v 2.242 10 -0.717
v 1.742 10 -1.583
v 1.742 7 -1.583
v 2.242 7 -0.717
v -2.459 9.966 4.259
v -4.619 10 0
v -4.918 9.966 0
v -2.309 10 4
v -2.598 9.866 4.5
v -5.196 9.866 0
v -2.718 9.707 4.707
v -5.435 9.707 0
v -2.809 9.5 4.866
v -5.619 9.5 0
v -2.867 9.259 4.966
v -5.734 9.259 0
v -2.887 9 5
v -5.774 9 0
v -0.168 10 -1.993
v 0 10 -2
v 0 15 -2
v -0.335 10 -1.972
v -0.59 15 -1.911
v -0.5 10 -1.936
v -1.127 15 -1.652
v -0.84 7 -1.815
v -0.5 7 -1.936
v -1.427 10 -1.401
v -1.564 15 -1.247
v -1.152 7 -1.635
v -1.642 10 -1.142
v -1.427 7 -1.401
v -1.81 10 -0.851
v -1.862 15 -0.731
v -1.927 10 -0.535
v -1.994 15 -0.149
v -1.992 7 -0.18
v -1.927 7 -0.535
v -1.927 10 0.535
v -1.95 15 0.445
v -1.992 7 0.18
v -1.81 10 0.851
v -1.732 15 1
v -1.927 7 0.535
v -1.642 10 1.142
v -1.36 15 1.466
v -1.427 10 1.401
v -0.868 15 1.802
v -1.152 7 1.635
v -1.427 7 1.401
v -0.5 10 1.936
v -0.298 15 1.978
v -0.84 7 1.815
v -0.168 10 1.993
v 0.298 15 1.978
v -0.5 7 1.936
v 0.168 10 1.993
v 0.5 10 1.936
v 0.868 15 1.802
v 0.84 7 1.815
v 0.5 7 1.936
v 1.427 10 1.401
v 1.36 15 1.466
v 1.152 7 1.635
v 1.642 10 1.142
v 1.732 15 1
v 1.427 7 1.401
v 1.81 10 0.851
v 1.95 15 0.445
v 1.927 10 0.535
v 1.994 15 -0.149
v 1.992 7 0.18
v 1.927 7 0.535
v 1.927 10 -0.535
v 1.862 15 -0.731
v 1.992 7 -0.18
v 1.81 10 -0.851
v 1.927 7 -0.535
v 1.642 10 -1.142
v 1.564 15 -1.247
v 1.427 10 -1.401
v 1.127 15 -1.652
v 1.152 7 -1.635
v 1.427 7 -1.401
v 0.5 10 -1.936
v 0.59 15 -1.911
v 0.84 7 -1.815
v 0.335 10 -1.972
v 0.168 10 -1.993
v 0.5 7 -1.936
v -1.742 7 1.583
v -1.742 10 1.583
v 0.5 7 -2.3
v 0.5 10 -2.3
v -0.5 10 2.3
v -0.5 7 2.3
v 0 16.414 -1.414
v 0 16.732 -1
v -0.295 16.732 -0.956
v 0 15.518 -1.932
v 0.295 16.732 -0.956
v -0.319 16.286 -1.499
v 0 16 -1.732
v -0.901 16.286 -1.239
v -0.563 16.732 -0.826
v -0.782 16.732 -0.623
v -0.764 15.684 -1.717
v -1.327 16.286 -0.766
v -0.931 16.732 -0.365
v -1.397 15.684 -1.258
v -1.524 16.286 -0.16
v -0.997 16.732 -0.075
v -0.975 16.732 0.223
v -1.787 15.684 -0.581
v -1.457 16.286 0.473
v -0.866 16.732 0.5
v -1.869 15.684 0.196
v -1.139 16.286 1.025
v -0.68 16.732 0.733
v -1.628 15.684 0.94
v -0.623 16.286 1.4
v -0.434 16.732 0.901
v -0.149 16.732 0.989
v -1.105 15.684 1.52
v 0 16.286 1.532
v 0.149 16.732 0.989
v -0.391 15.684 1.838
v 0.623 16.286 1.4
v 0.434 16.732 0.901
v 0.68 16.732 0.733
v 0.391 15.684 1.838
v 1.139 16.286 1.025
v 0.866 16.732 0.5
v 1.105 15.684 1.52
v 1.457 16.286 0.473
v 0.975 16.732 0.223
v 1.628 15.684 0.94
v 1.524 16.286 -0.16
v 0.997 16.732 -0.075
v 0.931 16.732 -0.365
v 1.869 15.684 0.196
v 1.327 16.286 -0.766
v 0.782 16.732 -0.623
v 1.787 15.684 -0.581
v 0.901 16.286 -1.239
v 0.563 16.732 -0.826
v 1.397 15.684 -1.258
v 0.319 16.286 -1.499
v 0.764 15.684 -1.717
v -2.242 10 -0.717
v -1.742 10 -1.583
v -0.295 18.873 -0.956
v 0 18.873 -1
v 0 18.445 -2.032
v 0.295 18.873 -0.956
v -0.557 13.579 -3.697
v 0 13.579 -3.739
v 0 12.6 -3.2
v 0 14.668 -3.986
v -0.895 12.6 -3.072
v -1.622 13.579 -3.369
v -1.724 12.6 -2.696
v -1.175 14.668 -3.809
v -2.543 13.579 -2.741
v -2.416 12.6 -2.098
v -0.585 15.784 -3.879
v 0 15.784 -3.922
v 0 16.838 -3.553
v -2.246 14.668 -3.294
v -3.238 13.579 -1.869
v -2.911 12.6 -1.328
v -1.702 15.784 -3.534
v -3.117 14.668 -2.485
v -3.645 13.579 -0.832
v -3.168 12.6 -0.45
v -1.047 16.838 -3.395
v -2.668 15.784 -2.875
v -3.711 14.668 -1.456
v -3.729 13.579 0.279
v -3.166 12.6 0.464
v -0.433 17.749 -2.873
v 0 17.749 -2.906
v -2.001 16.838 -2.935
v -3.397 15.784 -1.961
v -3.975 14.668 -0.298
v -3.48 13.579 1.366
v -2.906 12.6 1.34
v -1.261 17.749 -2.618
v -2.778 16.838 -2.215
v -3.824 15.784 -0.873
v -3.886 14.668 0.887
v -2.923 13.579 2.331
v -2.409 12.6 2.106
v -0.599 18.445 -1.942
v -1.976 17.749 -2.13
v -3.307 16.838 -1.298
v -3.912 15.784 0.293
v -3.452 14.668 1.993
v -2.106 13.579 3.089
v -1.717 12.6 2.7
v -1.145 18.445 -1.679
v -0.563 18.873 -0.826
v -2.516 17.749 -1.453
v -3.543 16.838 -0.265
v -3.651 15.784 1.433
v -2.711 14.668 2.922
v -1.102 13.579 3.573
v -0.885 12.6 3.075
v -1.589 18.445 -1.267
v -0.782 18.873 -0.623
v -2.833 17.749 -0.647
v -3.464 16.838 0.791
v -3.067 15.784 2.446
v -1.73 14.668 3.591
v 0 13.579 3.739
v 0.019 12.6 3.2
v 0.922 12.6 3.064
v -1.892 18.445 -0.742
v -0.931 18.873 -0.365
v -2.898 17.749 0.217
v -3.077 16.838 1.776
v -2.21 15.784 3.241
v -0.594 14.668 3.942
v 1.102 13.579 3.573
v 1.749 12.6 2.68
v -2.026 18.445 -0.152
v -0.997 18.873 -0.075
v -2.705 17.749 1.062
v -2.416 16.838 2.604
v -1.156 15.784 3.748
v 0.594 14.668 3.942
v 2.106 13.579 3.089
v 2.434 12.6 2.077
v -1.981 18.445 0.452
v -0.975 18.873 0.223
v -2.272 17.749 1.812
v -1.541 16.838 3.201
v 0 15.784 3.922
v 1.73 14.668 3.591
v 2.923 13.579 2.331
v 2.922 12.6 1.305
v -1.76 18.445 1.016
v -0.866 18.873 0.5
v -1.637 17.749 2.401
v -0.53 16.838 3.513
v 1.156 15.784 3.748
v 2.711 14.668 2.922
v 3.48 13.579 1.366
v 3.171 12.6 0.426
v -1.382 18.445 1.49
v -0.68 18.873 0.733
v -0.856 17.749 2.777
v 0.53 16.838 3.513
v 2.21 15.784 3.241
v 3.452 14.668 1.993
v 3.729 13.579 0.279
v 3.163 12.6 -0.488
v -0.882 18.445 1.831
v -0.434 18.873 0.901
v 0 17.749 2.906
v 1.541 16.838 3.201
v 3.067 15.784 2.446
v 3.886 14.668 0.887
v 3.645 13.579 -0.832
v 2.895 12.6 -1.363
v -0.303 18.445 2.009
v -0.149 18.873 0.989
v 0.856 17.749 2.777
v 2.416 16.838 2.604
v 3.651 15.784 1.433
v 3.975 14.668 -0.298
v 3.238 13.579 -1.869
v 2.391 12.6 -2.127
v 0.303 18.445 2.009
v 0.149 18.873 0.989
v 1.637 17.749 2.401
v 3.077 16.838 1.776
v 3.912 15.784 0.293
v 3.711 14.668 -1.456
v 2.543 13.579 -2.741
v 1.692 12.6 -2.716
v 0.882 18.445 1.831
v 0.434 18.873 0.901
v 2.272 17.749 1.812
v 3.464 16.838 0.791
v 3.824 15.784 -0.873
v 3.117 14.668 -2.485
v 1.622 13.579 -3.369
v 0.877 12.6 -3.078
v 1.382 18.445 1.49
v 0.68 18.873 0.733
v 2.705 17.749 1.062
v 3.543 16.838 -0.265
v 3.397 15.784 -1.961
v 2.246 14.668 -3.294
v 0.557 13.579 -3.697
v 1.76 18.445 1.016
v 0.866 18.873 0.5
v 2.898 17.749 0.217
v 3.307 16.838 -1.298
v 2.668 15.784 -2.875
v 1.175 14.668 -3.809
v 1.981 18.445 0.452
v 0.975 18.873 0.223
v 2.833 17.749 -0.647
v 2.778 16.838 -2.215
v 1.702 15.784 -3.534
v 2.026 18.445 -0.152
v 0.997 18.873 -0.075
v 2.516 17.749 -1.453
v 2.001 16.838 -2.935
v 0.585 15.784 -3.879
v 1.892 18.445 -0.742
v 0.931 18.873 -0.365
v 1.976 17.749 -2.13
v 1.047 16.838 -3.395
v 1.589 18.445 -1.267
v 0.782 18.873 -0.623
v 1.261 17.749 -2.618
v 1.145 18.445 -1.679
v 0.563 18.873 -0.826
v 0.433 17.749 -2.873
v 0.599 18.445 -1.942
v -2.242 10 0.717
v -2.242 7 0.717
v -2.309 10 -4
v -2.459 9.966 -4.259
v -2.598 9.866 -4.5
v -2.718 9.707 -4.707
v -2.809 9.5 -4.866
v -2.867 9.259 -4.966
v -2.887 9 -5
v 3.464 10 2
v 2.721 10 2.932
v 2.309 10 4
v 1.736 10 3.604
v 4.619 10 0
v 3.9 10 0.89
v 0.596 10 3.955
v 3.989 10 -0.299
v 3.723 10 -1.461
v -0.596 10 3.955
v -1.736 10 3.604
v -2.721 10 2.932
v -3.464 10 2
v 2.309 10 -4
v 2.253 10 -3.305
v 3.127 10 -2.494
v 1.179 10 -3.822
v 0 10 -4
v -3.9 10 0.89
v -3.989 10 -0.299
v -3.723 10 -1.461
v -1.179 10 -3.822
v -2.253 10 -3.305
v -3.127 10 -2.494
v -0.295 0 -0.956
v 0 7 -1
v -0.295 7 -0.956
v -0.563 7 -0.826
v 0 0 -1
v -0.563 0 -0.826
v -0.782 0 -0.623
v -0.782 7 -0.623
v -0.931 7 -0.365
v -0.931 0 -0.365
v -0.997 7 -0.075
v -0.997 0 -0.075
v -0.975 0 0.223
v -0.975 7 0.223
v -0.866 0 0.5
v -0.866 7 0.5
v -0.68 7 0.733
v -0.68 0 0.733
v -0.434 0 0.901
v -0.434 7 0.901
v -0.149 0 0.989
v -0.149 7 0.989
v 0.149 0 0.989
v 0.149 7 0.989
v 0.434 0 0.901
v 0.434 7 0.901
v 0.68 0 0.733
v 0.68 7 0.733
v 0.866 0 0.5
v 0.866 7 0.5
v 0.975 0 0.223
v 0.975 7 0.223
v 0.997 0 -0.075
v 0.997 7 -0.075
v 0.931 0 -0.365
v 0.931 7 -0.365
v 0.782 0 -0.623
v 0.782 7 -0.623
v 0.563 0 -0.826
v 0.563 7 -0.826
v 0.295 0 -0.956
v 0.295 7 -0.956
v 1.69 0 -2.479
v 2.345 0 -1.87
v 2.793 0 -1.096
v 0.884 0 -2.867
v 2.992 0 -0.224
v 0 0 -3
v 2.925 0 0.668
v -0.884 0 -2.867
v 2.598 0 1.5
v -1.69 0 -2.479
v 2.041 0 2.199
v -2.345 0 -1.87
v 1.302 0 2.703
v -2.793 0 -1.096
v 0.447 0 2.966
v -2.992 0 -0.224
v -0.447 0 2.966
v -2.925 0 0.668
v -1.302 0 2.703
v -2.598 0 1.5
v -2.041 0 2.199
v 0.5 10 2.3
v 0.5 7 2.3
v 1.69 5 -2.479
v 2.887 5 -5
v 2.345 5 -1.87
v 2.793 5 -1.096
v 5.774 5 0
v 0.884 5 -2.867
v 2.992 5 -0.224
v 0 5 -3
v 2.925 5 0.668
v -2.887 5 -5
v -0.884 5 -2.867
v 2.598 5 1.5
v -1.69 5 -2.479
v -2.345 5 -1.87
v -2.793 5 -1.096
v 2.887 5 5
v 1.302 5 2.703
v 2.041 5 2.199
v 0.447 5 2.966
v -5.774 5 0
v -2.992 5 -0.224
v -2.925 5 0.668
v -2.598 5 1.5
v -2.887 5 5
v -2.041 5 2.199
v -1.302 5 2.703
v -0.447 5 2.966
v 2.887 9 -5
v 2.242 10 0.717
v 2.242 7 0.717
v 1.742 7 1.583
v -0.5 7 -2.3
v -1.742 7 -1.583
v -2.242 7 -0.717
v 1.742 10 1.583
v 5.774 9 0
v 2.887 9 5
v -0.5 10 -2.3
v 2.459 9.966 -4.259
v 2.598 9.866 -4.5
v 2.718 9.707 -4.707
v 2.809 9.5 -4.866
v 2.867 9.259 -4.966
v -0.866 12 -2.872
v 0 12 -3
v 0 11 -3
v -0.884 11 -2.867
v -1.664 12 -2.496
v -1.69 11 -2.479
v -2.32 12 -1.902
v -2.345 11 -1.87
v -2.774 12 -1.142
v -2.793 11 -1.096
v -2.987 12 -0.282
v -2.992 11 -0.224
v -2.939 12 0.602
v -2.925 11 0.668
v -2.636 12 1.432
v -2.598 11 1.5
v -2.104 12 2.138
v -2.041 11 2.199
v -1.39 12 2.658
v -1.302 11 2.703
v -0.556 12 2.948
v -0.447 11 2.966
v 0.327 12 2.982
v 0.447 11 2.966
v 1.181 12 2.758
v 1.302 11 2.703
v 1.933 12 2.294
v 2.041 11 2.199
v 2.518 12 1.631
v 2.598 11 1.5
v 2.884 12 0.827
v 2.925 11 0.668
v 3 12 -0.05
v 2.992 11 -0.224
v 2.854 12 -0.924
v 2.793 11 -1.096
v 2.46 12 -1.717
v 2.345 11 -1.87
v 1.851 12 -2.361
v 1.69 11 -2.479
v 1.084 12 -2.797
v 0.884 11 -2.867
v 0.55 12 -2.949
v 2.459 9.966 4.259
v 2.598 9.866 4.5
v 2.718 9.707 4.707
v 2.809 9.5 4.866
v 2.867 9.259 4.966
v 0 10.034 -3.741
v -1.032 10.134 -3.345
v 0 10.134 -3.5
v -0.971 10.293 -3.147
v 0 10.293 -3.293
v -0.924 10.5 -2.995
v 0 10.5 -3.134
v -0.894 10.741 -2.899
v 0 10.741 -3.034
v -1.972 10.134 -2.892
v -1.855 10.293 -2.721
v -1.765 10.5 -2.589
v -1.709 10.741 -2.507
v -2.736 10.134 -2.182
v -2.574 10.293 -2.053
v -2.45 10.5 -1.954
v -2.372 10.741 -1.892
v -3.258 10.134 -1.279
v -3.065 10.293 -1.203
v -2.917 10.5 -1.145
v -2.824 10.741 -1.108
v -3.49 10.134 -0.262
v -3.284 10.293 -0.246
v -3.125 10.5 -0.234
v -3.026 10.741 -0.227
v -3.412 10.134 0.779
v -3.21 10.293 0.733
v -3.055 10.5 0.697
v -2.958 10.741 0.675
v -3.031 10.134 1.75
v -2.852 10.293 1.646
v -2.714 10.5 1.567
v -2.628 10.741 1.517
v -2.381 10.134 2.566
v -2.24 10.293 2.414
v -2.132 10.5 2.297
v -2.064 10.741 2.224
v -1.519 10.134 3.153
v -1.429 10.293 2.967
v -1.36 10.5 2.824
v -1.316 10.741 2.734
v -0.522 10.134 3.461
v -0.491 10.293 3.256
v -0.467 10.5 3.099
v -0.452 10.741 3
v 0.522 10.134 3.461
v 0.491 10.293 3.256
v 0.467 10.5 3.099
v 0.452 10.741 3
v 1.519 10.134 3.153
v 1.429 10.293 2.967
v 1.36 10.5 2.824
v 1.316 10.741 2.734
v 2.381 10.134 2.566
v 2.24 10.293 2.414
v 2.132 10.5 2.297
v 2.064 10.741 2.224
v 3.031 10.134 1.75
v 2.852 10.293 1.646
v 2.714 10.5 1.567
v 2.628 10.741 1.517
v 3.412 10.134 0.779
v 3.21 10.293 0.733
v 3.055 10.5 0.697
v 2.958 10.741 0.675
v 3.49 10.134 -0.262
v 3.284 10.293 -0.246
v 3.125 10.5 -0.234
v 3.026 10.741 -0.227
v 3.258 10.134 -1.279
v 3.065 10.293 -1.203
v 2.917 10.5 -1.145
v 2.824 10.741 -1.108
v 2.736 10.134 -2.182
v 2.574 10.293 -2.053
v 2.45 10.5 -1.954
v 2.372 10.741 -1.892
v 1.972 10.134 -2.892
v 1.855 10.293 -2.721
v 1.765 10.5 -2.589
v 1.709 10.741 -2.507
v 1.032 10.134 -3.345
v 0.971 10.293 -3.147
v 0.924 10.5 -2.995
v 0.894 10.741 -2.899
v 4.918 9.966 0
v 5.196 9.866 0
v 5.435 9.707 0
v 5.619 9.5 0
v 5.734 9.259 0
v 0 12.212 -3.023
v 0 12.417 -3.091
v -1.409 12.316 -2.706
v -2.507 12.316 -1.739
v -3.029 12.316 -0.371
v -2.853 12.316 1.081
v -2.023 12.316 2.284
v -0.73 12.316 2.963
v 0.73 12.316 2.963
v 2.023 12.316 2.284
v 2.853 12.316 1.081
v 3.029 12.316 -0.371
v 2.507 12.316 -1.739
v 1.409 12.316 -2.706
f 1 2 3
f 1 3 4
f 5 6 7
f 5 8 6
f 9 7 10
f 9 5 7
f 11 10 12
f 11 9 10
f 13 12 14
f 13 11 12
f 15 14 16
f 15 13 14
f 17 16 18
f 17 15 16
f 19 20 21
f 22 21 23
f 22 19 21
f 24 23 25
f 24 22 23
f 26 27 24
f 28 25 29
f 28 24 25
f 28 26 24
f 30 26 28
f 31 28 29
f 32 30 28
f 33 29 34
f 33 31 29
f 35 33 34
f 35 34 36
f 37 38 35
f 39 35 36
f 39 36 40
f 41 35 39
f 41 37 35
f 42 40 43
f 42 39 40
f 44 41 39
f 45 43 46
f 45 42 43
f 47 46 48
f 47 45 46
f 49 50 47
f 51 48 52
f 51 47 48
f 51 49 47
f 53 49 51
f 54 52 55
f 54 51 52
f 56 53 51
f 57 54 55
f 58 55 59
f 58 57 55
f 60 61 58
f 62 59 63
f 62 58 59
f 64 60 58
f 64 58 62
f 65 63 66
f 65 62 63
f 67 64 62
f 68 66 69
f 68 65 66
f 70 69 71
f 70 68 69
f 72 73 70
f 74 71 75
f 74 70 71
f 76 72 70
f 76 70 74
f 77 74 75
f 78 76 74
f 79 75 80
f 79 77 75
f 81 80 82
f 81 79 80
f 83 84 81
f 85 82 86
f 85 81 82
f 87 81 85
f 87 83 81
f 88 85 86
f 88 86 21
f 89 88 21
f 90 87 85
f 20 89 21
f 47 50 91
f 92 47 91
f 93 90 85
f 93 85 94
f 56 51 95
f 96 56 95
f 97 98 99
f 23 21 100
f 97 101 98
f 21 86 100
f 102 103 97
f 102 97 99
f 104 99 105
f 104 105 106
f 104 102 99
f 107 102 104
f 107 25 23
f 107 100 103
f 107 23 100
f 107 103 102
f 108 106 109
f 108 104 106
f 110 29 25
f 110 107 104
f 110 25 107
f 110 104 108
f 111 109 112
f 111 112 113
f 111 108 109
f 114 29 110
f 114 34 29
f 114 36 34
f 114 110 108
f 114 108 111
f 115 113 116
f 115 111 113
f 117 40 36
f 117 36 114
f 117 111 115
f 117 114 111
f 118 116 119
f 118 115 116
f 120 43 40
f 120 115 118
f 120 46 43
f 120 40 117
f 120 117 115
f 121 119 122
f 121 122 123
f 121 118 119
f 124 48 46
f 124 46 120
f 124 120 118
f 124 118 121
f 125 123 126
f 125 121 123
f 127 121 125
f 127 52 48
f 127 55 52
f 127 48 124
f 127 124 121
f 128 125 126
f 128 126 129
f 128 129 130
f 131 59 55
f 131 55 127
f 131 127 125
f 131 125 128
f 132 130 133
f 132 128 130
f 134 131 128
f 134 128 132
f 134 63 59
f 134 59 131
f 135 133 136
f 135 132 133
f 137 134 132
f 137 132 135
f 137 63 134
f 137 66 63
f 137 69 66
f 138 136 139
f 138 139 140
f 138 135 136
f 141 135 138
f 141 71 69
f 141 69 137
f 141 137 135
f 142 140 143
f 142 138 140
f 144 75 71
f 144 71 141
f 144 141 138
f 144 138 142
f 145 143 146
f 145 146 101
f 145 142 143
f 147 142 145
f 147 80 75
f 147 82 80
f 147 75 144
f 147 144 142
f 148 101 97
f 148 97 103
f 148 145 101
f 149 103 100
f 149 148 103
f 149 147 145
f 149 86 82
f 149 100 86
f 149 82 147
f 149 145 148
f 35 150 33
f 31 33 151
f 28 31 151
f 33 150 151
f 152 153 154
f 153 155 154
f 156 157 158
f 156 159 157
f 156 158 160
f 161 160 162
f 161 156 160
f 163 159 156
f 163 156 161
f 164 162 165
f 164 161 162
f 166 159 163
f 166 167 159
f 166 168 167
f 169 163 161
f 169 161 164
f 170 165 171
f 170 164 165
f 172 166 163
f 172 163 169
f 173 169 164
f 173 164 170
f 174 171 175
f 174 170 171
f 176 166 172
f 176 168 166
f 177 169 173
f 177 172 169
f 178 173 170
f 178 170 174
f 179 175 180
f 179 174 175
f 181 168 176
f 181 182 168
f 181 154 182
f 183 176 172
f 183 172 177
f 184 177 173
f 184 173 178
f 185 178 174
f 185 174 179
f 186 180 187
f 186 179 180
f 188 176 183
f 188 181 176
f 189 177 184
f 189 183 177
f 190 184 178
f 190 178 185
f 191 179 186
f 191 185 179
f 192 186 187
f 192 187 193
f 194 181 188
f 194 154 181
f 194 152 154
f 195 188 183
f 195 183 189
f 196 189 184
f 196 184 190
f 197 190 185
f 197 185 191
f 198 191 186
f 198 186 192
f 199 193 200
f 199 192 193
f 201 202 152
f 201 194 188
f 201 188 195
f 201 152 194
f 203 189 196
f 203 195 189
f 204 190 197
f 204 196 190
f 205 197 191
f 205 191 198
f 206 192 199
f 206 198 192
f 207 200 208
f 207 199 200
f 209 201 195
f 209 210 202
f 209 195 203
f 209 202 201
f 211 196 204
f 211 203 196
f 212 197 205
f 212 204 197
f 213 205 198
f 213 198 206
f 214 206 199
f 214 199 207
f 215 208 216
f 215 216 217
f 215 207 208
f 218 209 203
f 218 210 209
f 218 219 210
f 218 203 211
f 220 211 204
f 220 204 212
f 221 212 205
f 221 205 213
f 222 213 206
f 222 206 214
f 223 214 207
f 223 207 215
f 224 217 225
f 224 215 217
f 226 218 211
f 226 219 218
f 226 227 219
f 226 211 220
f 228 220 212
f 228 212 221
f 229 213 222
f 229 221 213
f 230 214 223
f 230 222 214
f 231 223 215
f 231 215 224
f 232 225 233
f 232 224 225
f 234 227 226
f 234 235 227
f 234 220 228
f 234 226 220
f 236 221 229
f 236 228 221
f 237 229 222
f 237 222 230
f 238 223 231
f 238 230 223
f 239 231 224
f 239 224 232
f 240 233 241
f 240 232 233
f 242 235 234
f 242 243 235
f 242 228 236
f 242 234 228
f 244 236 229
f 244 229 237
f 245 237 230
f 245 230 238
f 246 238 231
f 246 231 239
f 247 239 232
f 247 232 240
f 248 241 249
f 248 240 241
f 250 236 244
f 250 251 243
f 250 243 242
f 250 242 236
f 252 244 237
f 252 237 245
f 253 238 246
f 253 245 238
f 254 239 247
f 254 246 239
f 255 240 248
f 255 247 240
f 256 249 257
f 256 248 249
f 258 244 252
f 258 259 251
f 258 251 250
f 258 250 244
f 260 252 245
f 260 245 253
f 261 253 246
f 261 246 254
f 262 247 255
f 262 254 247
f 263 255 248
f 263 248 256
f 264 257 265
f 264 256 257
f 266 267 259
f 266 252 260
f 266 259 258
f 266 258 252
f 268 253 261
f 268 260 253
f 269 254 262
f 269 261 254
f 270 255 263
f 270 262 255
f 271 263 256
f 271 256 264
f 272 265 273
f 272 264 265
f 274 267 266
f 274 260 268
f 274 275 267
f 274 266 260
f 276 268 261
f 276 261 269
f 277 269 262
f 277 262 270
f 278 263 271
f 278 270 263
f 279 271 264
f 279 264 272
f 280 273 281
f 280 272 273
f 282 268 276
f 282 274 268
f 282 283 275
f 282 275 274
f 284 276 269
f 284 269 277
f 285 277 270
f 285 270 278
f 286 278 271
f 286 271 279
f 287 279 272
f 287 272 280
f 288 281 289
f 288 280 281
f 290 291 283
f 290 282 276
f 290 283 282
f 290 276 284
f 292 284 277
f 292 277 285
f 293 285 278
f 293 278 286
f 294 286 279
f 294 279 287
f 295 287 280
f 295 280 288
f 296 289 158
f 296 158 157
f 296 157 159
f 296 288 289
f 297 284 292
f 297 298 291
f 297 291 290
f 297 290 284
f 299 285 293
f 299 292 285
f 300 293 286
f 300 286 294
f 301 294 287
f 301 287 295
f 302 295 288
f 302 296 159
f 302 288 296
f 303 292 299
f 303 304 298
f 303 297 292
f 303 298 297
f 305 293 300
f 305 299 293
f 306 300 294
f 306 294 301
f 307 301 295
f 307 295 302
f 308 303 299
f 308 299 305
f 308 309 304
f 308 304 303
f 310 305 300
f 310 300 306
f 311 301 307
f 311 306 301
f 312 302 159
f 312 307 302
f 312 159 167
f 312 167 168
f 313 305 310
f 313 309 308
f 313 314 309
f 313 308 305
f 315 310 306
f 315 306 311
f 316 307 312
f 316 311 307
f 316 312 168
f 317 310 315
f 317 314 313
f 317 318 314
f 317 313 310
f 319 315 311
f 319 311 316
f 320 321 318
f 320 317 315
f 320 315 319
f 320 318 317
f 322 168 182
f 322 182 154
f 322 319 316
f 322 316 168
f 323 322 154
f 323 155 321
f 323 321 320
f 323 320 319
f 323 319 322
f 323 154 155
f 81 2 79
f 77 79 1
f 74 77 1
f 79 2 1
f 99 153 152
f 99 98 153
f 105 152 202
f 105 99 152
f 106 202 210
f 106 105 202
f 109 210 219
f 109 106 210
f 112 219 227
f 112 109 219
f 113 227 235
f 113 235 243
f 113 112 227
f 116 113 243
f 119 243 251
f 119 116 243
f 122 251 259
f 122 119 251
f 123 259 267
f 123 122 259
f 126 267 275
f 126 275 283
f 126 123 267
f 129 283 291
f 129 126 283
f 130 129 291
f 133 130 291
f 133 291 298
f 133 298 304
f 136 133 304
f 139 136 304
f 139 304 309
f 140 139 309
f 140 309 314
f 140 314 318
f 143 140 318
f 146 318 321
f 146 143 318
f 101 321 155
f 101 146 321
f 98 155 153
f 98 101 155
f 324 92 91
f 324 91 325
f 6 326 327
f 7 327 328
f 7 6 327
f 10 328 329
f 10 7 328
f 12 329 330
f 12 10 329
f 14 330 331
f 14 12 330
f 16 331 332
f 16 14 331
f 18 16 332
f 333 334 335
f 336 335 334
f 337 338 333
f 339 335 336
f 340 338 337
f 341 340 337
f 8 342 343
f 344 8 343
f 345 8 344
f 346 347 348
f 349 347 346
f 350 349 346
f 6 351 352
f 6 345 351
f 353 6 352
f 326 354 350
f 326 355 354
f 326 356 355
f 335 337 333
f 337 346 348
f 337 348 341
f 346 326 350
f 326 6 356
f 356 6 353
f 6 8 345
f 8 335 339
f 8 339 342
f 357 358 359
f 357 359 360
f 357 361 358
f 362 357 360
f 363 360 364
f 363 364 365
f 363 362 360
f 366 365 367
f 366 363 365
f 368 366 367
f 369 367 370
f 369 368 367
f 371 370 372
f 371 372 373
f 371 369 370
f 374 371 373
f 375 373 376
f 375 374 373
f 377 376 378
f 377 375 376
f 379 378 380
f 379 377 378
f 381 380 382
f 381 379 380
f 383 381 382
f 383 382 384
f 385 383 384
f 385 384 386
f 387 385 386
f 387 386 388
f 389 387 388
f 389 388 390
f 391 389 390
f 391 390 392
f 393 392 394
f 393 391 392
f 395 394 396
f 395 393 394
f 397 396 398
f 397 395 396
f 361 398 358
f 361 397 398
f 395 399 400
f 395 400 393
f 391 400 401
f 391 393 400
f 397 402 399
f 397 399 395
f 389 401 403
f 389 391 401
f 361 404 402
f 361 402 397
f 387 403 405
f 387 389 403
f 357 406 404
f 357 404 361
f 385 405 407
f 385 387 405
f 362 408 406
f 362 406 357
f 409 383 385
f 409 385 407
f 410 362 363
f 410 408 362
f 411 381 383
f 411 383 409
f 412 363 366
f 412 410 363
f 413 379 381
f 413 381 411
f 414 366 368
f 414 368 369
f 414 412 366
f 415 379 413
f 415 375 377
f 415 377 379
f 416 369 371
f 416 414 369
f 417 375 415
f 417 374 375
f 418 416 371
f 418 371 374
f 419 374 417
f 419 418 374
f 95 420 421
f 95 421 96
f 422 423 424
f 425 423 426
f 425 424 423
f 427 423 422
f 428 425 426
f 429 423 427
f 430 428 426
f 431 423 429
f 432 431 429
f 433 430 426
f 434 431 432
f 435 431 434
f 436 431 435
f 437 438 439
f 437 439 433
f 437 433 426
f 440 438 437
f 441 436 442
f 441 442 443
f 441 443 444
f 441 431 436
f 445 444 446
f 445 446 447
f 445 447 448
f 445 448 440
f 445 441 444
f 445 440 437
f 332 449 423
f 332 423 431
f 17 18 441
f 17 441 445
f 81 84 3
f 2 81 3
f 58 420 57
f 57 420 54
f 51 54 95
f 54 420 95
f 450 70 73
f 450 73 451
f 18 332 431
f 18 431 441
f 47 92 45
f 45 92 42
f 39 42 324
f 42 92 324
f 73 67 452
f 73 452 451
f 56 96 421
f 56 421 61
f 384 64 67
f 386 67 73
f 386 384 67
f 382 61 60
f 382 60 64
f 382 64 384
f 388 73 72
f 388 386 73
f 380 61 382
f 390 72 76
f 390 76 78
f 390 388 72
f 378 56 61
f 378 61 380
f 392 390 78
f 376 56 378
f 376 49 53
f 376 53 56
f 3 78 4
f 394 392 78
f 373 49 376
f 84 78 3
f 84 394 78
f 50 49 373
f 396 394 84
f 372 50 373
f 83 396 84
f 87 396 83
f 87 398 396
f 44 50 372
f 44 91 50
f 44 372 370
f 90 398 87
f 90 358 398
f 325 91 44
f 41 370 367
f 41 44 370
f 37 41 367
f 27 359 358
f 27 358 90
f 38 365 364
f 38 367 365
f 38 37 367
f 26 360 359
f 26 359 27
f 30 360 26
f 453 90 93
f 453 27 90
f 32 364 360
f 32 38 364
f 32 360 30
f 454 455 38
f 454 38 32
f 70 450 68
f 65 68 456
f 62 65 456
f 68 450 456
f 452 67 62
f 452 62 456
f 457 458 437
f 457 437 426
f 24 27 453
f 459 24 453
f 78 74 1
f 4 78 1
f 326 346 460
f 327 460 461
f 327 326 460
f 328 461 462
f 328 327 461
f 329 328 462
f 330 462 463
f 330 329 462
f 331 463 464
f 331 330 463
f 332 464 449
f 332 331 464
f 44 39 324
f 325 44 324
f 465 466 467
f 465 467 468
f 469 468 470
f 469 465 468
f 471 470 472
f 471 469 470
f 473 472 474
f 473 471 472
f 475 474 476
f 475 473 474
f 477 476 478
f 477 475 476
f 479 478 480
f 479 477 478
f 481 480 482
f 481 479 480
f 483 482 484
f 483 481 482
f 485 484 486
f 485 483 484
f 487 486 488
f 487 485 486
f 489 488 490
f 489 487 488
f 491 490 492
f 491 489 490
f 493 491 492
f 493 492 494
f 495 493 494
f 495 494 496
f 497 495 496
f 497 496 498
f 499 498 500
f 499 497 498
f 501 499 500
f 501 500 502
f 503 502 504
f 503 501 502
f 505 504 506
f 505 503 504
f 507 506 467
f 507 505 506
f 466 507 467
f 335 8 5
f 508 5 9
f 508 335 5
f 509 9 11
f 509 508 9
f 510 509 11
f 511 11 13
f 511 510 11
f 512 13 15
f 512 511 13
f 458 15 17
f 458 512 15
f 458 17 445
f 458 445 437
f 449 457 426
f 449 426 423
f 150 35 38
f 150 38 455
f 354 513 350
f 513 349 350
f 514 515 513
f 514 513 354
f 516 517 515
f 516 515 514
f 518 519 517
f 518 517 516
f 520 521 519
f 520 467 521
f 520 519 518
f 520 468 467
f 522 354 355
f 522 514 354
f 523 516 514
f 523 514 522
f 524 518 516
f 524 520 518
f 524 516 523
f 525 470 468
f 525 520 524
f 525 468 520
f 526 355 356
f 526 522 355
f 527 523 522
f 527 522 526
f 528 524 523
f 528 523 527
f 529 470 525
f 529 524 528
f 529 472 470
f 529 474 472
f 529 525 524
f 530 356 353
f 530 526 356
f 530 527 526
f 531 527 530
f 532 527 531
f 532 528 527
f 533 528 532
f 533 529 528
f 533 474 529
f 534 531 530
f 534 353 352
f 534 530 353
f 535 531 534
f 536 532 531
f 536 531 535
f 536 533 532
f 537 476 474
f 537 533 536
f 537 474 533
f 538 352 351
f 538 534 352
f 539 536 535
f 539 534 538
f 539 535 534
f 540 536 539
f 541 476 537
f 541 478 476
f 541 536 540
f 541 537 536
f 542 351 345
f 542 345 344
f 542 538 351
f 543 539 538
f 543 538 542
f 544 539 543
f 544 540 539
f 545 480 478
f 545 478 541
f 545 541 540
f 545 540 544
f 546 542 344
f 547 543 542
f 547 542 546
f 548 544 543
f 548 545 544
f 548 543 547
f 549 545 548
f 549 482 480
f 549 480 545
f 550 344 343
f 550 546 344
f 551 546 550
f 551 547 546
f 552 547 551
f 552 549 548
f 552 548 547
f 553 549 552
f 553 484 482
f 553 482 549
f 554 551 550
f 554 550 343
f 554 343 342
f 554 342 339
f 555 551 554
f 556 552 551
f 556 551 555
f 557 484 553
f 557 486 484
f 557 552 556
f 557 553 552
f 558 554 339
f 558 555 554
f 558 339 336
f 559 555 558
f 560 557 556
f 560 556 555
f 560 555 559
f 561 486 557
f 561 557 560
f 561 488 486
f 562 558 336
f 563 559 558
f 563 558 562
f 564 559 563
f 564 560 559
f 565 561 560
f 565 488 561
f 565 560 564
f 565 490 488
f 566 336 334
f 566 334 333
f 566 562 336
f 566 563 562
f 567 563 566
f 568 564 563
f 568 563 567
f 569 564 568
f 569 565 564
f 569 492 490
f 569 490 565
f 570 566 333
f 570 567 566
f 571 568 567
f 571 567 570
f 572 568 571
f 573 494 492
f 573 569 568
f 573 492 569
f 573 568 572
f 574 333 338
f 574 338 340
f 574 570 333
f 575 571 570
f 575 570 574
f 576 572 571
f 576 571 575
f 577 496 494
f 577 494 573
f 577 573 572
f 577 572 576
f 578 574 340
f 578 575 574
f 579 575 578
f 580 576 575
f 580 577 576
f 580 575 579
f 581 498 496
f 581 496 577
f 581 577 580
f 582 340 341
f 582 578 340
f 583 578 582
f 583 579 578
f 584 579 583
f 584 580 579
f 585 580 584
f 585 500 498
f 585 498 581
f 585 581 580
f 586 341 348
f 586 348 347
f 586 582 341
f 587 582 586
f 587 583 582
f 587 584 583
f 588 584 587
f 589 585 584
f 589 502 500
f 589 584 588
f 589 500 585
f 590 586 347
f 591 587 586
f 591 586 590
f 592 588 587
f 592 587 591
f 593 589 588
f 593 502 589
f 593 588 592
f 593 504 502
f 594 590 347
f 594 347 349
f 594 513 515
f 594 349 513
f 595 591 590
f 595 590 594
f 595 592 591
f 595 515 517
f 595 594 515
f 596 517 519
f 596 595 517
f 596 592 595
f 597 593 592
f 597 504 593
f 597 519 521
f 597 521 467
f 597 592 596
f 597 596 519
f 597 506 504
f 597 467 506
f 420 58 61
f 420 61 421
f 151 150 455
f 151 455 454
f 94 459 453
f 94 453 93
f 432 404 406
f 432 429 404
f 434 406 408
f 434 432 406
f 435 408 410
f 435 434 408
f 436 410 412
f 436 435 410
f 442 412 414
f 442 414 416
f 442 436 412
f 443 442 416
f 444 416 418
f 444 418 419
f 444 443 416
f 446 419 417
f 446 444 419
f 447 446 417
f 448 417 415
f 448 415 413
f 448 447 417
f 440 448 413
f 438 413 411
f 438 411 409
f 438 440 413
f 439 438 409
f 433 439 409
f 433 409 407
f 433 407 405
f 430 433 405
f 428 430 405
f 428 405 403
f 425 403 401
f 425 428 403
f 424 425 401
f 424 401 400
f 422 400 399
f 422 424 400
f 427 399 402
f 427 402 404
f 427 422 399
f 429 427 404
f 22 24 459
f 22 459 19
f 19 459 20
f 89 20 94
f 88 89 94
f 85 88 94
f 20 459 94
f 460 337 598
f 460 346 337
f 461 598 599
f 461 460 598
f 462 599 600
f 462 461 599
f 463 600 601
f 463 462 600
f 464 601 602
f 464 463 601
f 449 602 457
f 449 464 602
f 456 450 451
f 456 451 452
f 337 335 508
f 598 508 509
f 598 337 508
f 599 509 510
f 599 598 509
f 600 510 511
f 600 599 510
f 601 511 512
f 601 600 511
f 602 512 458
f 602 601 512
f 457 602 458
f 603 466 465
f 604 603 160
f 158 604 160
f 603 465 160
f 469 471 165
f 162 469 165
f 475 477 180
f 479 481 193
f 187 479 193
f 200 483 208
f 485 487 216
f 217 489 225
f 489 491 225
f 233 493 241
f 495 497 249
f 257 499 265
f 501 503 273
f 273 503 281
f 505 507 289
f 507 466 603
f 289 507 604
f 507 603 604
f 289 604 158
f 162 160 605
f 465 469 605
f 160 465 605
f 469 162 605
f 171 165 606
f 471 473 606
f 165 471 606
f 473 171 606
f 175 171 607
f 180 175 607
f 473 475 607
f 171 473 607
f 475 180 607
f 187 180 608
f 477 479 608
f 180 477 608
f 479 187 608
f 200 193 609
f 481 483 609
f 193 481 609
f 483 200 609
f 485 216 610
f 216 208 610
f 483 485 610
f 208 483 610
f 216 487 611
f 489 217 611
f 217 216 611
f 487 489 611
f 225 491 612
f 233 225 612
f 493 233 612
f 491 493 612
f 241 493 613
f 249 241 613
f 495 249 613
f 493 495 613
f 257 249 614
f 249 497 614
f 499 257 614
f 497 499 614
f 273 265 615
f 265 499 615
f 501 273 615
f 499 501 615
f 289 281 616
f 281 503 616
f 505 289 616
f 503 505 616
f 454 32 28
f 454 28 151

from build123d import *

# Parameters (mm, degrees)
SKETCH2_R          = 10.06808877
CUT_EXTRUDE1_DEPTH = 10
FILLET1_R          = 1
FILLET2_R          = 1
SKETCH3_W          = 1
SKETCH3_H          = 0.936459383
CUT_EXTRUDE2_DEPTH = 3
CIRPATTERN1_COUNT  = 6


with BuildPart() as part:
    # Sketch1 → Revolve1 (revolve)
    with BuildSketch(Plane.XY, mode=Mode.PRIVATE) as revolve1_sk:
        with BuildLine():
            Line((-1, 0), (-3, 0))
            Line((-3, 0), (-3, 5))
            Line((-3, 5), (-6, 5))
            Line((-6, 5), (-6, 10))
            Line((-6, 10), (-3, 10))
            Line((-3, 10), (-3, 12.354248689))
            ThreePointArc((-3, 12.354248689), (-3.824065295, 16.173253859), (-1, 18.872983346))
            Line((-1, 18.872983346), (-1, 16.732050808))
            ThreePointArc((-1, 16.732050808), (-1.732050808, 16), (-2, 15))
            Line((-2, 15), (-2, 7))
            Line((-2, 7), (-1, 7))
            Line((-1, 7), (-1, 0))
        make_face()
    revolve(revolve1_sk.sketch.rotate(Axis((0, 0, 0), (0, 1, 0)), 270), axis=Axis((0, 0, 0), (0, 1, 0)))

    # Sketch2 → Cut-Extrude1 (cut)
    with BuildSketch(Plane(origin=(0, 10, 0), x_dir=(1, 0, 0), z_dir=(0, 1, 0))):
        Circle(SKETCH2_R)
        Polygon((5.773502692, 0), (2.886751346, 5), (-2.886751346, 5), (-5.773502692, 0), (-2.886751346, -5), (2.886751346, -5), align=None, mode=Mode.SUBTRACT)
    extrude(amount=-CUT_EXTRUDE1_DEPTH, mode=Mode.SUBTRACT)

    # Fillet1
    fillet1_edges = [part.edges().sort_by_distance(p)[0] for p in [
        (0, 12.354248689, 3),
        (0, 10, 3),
    ]]
    fillet(fillet1_edges, radius=FILLET1_R)

    # Fillet2
    fillet2_edges = [part.edges().sort_by_distance(p)[0] for p in [
        (4.330127019, 10, 2.5),
        (0, 10, 5),
        (-4.330127019, 10, 2.5),
        (-4.330127019, 10, -2.5),
        (0, 10, -5),
        (4.330127019, 10, -2.5),
    ]]
    fillet(fillet2_edges, radius=FILLET2_R - 0.0001)  # a hair under: the kernel refuses the full size

    # Sketch3 → Cut-Extrude2 (cut)
    with BuildSketch(Plane(origin=(0, 10, 0), x_dir=(1, 0, 0), z_dir=(0, 1, 0))):
        with Locations((0, 1.831770309)):
            Rectangle(SKETCH3_W, SKETCH3_H)
    cut_extrude2 = extrude(amount=-CUT_EXTRUDE2_DEPTH, mode=Mode.SUBTRACT)

    # CirPattern1: Cut-Extrude2 ×6 about axis
    cirpattern1_axis = Axis((0, 0, 0), (0, 1, 0))
    for i in range(1, CIRPATTERN1_COUNT):
        add(cut_extrude2.rotate(cirpattern1_axis, i * 360 / CIRPATTERN1_COUNT), mode=Mode.SUBTRACT)


solid = part.part
